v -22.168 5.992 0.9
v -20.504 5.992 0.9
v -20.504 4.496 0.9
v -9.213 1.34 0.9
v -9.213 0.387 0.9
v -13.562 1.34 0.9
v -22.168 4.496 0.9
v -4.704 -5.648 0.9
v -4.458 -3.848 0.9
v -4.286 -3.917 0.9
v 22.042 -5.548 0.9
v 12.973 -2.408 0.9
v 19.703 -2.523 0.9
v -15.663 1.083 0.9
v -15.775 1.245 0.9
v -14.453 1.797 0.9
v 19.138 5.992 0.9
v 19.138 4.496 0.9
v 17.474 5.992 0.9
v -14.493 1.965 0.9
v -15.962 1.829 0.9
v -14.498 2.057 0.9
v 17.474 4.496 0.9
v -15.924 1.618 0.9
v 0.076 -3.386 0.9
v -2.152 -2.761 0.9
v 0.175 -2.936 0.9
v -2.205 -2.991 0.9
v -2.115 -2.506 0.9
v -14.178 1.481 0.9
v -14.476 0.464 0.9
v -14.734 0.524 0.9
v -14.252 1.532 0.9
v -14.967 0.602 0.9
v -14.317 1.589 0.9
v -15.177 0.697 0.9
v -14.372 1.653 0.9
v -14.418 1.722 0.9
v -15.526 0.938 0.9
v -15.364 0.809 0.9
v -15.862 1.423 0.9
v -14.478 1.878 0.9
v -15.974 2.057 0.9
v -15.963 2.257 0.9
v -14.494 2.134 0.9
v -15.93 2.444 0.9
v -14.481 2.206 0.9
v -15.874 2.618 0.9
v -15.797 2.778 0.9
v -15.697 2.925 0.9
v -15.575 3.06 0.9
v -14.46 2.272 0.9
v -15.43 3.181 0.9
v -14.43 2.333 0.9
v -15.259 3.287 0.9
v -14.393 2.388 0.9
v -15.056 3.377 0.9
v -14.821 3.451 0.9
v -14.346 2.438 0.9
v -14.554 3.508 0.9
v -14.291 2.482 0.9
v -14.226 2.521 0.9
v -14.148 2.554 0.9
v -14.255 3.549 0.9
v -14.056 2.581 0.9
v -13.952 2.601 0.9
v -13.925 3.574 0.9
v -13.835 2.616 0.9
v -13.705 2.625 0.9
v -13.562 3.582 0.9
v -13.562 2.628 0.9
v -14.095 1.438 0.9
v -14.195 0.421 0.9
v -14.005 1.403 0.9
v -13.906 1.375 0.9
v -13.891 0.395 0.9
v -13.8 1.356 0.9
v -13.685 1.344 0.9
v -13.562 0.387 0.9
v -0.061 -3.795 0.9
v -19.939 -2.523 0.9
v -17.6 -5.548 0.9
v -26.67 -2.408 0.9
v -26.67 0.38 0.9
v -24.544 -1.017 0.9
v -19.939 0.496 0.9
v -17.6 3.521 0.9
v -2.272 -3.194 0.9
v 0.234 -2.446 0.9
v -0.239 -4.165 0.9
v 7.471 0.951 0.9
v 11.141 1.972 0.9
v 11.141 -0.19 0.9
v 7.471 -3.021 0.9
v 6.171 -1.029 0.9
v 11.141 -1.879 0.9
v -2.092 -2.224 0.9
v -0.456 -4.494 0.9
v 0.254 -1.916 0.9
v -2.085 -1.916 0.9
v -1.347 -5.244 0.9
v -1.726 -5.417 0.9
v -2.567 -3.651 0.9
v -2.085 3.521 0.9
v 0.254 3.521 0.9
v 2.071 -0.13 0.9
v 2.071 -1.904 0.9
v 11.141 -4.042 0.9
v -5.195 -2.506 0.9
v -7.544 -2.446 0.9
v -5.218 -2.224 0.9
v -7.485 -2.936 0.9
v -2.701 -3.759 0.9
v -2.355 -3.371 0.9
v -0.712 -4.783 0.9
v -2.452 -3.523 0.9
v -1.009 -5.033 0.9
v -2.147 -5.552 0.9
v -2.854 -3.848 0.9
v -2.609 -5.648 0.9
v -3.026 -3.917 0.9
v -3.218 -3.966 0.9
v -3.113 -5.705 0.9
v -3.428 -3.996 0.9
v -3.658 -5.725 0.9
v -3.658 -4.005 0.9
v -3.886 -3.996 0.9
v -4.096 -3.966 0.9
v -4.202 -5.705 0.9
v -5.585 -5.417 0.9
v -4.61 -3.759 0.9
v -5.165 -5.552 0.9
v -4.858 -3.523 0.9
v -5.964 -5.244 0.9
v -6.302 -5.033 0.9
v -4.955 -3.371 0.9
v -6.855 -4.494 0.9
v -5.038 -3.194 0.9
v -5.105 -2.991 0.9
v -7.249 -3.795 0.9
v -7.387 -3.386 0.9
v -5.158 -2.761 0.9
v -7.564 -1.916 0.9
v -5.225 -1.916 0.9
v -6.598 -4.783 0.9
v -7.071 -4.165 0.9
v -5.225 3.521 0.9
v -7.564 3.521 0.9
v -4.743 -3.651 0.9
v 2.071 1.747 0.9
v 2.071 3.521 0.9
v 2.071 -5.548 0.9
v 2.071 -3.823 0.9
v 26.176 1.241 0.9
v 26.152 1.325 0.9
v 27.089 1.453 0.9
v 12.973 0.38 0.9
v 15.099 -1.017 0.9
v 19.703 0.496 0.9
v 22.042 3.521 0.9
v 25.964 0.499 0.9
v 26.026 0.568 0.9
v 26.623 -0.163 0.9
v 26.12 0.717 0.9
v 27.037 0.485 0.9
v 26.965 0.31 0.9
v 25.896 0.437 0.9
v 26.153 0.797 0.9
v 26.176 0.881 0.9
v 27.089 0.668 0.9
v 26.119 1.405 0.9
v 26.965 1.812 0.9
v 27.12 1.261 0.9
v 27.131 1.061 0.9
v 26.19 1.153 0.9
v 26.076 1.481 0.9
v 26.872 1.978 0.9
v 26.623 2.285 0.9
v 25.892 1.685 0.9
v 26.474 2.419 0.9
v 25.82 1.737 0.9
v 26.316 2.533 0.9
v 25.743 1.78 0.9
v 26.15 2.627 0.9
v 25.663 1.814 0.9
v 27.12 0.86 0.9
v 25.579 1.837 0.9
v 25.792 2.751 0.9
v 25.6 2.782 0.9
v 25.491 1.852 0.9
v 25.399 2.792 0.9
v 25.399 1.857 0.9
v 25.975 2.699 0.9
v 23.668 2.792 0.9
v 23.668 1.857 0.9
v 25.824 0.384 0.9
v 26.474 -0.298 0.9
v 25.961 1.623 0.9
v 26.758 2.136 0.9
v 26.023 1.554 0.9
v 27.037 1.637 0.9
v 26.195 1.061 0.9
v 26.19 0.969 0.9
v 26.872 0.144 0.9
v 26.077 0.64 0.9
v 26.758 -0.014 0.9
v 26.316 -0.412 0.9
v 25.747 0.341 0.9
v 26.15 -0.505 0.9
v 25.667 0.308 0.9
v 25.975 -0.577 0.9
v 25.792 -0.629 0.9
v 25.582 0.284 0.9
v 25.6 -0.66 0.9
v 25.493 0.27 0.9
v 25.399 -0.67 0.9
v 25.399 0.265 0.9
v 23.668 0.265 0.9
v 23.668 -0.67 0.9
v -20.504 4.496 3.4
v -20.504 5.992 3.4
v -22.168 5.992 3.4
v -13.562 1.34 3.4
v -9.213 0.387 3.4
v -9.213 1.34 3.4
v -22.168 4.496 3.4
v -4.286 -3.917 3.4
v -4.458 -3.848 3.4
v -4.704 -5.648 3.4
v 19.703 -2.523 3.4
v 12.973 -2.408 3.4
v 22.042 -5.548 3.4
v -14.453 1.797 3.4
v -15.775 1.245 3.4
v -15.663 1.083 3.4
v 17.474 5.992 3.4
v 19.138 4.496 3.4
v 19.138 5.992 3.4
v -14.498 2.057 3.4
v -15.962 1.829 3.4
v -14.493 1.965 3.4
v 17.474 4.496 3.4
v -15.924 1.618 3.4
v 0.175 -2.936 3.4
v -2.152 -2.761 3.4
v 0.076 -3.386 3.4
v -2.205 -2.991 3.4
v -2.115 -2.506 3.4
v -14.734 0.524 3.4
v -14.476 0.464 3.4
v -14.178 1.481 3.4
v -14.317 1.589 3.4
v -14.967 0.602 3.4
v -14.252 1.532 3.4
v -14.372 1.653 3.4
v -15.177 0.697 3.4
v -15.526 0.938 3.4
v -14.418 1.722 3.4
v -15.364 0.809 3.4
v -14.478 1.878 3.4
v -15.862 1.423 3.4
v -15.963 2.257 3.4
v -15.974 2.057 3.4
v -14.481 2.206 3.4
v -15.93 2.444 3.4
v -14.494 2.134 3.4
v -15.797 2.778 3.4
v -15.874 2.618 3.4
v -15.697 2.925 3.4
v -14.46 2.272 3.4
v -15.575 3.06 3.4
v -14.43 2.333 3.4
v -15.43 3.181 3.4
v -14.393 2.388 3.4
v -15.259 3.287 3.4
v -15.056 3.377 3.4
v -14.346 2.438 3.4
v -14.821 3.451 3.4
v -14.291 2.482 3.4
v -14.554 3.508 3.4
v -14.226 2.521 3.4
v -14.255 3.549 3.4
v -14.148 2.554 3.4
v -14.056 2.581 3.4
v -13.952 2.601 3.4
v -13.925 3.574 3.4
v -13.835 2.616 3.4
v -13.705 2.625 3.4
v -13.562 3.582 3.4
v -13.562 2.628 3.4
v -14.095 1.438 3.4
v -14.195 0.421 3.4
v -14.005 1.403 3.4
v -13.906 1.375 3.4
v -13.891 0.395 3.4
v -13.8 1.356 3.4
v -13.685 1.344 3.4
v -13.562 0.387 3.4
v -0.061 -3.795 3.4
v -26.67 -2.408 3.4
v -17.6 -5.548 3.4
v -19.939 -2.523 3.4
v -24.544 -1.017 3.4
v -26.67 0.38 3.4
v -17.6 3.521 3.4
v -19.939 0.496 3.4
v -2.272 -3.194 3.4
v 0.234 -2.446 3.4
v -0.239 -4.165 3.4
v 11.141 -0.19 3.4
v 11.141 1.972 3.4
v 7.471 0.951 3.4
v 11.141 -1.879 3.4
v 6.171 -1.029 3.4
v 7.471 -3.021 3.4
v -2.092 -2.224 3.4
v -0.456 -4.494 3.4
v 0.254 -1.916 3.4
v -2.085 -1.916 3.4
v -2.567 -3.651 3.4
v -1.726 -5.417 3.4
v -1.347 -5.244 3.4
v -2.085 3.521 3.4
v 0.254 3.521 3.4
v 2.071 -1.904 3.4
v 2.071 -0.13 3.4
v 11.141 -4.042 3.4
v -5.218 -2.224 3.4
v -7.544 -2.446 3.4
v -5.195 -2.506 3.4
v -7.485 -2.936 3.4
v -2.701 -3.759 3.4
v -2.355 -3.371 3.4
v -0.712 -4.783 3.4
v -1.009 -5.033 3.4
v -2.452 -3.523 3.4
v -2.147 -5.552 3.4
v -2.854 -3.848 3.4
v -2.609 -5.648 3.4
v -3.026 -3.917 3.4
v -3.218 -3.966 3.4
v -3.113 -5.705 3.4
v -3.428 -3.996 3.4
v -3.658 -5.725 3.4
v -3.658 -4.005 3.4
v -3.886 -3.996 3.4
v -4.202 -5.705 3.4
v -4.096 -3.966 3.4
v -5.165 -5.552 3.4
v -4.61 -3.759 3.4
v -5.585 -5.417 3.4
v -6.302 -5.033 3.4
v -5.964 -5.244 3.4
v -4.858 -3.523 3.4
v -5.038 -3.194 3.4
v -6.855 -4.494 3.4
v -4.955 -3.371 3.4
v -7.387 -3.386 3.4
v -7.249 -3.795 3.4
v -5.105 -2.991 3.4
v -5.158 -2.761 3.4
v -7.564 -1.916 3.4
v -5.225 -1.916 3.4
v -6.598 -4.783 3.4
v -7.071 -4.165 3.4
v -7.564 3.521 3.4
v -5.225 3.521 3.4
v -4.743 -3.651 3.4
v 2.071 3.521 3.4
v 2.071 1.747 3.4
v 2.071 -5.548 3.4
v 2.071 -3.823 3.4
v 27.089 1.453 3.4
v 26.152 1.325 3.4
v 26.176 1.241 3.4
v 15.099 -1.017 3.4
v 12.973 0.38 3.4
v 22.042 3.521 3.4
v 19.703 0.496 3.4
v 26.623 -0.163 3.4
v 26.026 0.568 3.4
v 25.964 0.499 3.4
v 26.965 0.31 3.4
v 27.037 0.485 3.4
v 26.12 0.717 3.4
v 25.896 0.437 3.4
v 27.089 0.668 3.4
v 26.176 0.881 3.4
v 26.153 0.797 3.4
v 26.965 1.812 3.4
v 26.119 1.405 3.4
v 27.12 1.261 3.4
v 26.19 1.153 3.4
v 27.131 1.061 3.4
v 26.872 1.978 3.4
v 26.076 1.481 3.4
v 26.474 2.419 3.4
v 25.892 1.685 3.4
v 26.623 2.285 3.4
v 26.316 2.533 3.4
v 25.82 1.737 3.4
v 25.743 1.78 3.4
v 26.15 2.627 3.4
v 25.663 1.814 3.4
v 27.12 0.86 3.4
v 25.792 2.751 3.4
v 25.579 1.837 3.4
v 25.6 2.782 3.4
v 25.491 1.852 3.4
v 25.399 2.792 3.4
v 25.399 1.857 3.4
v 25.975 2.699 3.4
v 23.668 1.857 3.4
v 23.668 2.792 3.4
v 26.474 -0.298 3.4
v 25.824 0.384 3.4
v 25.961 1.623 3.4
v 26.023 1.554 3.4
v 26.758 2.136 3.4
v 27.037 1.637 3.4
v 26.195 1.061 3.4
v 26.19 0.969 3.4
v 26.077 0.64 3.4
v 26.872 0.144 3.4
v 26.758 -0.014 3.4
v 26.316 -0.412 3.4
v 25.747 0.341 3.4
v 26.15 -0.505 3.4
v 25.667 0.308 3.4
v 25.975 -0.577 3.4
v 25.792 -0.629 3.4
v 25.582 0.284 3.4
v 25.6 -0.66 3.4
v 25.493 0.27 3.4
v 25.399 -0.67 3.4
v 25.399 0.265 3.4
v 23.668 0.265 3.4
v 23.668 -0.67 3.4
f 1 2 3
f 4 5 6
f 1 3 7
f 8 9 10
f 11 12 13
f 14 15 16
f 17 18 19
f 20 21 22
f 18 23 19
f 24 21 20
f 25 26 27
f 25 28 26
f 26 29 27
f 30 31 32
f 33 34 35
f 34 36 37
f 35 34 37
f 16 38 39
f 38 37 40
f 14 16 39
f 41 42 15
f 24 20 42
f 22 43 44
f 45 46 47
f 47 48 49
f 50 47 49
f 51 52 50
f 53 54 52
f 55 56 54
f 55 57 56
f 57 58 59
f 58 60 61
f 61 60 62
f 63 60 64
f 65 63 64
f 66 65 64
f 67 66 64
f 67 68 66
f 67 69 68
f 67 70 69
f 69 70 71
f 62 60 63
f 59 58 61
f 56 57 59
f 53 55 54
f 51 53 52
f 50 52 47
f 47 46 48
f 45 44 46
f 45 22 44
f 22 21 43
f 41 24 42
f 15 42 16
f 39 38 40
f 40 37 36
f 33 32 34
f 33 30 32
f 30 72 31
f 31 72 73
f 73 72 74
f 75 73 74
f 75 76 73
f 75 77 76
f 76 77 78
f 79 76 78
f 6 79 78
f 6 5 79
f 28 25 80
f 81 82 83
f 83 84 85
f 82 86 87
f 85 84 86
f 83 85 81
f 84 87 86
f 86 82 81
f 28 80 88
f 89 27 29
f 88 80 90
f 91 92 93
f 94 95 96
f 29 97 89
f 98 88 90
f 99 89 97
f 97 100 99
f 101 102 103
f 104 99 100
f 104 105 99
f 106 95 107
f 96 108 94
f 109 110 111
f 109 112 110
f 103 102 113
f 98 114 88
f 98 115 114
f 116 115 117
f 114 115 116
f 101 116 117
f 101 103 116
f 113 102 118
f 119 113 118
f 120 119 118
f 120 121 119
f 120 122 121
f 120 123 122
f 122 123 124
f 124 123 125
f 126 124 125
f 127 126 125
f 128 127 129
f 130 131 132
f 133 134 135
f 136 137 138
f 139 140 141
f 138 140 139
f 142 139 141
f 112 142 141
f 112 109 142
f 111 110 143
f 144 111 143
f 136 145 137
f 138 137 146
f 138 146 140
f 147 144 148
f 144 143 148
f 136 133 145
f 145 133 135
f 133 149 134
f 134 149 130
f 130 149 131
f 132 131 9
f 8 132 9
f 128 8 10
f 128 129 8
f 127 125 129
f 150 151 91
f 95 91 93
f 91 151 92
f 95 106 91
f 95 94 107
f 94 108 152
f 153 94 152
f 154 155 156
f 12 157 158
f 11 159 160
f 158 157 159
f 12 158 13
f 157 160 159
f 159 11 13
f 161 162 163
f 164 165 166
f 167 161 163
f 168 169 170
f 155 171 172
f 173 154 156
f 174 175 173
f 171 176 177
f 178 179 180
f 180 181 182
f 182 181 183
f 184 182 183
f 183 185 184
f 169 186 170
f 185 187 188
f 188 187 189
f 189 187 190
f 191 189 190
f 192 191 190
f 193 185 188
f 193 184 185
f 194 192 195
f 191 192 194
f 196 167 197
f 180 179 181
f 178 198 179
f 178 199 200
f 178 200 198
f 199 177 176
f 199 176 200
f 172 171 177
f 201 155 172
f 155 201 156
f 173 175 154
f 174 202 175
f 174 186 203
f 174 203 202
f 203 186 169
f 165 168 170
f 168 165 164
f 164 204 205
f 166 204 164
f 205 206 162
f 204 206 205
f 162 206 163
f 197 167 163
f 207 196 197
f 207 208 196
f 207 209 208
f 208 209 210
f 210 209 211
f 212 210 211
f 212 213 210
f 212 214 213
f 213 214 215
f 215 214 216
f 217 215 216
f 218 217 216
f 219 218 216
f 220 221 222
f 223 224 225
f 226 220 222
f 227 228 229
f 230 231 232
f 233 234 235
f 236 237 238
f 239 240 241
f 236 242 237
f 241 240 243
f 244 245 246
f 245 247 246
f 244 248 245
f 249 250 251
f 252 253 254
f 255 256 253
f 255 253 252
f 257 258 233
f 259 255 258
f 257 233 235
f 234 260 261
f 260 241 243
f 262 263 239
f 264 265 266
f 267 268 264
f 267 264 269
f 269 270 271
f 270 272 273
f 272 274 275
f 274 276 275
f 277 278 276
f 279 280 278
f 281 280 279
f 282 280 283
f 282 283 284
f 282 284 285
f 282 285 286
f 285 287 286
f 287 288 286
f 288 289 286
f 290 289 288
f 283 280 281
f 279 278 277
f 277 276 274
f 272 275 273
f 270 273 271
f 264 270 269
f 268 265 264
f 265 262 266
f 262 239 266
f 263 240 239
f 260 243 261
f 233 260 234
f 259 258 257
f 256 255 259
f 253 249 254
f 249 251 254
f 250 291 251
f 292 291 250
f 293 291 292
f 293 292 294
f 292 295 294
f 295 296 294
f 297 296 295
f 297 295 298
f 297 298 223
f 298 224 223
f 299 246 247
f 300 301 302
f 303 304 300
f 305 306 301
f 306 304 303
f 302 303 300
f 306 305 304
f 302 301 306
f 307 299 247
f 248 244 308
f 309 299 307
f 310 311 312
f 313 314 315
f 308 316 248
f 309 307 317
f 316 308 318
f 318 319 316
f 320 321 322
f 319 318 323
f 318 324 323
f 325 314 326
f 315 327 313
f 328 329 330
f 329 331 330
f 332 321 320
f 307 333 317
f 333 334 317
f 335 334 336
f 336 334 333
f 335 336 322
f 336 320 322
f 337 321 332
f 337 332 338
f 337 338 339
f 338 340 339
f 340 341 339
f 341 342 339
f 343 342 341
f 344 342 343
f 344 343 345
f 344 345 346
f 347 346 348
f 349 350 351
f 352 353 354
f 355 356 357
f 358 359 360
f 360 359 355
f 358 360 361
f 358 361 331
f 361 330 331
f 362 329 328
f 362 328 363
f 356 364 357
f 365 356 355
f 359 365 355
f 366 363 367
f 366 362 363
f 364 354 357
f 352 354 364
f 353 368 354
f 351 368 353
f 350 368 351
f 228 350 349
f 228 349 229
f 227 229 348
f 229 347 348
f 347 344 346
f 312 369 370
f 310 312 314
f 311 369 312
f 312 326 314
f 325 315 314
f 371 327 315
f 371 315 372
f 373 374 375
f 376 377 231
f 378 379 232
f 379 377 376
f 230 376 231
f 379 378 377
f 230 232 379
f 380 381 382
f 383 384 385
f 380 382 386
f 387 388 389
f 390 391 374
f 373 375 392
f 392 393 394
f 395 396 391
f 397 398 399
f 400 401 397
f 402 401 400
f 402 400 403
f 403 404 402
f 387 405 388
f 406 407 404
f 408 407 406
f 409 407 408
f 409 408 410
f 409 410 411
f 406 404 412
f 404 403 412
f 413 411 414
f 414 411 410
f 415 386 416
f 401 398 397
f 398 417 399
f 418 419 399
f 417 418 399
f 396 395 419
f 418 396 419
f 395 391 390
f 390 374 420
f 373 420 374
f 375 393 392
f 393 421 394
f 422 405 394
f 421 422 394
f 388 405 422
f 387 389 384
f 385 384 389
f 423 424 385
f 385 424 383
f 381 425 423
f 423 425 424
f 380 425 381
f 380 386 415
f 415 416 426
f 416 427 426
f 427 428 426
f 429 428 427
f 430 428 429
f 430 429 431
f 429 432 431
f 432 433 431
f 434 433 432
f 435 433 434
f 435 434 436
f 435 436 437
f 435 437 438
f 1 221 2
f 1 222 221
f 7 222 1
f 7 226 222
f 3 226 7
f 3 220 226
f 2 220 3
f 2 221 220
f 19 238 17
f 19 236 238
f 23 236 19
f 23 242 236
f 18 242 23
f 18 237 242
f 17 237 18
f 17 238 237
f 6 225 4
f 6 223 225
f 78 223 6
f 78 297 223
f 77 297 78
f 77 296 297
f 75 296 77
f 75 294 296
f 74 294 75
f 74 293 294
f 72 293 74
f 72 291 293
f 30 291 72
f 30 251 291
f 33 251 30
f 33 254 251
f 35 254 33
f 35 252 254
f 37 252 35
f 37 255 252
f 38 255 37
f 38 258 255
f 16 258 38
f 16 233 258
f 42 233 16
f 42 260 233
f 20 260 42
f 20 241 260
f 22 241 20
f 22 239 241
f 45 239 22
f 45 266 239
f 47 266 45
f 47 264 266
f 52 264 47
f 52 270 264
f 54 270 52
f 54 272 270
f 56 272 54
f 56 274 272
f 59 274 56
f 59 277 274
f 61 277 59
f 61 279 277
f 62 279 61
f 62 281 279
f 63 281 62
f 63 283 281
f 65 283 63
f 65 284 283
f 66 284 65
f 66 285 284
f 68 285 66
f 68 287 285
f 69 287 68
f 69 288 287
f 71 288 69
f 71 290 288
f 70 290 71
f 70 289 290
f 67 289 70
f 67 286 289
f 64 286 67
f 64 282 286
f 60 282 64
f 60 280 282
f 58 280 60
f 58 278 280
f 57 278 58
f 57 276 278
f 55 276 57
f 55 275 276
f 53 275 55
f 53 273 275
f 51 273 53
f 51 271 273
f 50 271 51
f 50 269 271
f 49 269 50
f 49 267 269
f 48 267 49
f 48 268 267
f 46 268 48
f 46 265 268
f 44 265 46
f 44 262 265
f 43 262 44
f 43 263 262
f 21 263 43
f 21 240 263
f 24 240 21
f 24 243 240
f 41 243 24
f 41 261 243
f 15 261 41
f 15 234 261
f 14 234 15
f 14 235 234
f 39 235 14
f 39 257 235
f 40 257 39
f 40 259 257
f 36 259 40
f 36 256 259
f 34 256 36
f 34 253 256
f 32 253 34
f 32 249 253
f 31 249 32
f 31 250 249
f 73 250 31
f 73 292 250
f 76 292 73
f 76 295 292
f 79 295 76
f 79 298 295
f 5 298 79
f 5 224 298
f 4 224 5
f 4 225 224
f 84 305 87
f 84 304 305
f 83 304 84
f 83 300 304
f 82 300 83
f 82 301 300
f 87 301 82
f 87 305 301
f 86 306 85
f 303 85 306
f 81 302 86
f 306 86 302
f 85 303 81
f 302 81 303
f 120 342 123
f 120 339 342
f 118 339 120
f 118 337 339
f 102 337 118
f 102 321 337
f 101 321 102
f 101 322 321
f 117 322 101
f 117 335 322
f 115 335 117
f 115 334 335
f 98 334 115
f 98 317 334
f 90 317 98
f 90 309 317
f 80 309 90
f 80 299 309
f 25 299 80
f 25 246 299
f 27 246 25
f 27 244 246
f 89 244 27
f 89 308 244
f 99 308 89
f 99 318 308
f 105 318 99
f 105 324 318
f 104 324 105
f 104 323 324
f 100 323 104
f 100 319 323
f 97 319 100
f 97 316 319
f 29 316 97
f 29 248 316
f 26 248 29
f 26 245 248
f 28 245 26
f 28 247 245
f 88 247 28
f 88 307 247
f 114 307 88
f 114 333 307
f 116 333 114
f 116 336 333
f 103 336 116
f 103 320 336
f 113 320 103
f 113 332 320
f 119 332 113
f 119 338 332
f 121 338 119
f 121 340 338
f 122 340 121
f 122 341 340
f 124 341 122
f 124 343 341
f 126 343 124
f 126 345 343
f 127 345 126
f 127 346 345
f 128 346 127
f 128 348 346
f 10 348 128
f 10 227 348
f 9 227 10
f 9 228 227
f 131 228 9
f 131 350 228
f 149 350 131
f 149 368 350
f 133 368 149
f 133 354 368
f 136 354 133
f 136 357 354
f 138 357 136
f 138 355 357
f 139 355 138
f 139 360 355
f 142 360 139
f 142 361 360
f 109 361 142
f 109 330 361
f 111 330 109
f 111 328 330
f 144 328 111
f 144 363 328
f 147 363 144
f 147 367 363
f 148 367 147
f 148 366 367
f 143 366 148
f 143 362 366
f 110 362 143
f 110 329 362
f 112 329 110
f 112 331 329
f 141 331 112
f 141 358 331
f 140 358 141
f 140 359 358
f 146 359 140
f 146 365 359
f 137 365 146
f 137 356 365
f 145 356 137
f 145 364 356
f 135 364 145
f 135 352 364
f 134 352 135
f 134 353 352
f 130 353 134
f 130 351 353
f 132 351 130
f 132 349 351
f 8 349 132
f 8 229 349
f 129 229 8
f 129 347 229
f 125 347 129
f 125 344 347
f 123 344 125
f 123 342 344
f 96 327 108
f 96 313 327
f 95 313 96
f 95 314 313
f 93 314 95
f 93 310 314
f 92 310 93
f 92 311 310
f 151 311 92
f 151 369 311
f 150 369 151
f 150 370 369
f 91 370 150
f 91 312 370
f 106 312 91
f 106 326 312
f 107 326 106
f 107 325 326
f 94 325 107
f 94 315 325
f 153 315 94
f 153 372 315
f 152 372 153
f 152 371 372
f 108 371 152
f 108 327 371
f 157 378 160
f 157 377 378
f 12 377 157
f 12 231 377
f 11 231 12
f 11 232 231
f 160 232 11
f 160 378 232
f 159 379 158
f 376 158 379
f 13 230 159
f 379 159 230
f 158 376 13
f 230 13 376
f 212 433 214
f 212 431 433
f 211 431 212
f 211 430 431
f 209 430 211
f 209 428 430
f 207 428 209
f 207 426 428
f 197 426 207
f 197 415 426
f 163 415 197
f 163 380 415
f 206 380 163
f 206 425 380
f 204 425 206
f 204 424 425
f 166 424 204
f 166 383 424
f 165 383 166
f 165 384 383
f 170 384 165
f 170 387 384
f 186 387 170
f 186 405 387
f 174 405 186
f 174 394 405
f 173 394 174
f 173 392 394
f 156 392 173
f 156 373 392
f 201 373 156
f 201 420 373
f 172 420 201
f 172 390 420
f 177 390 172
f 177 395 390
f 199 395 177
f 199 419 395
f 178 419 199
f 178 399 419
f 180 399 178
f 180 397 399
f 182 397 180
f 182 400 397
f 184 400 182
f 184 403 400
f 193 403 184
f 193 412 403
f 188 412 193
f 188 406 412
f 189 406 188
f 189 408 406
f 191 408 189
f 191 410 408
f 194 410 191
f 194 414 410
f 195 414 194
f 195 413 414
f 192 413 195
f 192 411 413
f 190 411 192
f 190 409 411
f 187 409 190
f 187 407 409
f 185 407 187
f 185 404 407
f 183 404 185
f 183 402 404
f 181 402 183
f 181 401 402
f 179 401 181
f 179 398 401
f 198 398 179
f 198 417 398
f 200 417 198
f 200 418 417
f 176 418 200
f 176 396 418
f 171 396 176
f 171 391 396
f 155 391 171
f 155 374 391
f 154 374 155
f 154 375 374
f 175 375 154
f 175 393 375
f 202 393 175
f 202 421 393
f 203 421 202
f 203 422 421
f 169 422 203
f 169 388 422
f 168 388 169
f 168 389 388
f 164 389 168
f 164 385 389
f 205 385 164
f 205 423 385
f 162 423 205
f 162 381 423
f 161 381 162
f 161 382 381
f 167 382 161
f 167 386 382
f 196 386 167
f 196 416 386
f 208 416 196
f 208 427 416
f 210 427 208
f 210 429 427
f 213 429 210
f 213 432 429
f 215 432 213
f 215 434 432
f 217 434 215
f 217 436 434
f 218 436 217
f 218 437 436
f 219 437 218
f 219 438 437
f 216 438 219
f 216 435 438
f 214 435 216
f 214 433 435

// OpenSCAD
$fn = 48;
  // syllabics (overlaid on icon, tallest)
  translate([0, 0.000, 0.900]) linear_extrude(height=2.500) text("ᐋᓪᑌᕒᐋᐣ", size=8.958, halign="center", valign="center", font="Euphemia UCAS:style=Bold");
